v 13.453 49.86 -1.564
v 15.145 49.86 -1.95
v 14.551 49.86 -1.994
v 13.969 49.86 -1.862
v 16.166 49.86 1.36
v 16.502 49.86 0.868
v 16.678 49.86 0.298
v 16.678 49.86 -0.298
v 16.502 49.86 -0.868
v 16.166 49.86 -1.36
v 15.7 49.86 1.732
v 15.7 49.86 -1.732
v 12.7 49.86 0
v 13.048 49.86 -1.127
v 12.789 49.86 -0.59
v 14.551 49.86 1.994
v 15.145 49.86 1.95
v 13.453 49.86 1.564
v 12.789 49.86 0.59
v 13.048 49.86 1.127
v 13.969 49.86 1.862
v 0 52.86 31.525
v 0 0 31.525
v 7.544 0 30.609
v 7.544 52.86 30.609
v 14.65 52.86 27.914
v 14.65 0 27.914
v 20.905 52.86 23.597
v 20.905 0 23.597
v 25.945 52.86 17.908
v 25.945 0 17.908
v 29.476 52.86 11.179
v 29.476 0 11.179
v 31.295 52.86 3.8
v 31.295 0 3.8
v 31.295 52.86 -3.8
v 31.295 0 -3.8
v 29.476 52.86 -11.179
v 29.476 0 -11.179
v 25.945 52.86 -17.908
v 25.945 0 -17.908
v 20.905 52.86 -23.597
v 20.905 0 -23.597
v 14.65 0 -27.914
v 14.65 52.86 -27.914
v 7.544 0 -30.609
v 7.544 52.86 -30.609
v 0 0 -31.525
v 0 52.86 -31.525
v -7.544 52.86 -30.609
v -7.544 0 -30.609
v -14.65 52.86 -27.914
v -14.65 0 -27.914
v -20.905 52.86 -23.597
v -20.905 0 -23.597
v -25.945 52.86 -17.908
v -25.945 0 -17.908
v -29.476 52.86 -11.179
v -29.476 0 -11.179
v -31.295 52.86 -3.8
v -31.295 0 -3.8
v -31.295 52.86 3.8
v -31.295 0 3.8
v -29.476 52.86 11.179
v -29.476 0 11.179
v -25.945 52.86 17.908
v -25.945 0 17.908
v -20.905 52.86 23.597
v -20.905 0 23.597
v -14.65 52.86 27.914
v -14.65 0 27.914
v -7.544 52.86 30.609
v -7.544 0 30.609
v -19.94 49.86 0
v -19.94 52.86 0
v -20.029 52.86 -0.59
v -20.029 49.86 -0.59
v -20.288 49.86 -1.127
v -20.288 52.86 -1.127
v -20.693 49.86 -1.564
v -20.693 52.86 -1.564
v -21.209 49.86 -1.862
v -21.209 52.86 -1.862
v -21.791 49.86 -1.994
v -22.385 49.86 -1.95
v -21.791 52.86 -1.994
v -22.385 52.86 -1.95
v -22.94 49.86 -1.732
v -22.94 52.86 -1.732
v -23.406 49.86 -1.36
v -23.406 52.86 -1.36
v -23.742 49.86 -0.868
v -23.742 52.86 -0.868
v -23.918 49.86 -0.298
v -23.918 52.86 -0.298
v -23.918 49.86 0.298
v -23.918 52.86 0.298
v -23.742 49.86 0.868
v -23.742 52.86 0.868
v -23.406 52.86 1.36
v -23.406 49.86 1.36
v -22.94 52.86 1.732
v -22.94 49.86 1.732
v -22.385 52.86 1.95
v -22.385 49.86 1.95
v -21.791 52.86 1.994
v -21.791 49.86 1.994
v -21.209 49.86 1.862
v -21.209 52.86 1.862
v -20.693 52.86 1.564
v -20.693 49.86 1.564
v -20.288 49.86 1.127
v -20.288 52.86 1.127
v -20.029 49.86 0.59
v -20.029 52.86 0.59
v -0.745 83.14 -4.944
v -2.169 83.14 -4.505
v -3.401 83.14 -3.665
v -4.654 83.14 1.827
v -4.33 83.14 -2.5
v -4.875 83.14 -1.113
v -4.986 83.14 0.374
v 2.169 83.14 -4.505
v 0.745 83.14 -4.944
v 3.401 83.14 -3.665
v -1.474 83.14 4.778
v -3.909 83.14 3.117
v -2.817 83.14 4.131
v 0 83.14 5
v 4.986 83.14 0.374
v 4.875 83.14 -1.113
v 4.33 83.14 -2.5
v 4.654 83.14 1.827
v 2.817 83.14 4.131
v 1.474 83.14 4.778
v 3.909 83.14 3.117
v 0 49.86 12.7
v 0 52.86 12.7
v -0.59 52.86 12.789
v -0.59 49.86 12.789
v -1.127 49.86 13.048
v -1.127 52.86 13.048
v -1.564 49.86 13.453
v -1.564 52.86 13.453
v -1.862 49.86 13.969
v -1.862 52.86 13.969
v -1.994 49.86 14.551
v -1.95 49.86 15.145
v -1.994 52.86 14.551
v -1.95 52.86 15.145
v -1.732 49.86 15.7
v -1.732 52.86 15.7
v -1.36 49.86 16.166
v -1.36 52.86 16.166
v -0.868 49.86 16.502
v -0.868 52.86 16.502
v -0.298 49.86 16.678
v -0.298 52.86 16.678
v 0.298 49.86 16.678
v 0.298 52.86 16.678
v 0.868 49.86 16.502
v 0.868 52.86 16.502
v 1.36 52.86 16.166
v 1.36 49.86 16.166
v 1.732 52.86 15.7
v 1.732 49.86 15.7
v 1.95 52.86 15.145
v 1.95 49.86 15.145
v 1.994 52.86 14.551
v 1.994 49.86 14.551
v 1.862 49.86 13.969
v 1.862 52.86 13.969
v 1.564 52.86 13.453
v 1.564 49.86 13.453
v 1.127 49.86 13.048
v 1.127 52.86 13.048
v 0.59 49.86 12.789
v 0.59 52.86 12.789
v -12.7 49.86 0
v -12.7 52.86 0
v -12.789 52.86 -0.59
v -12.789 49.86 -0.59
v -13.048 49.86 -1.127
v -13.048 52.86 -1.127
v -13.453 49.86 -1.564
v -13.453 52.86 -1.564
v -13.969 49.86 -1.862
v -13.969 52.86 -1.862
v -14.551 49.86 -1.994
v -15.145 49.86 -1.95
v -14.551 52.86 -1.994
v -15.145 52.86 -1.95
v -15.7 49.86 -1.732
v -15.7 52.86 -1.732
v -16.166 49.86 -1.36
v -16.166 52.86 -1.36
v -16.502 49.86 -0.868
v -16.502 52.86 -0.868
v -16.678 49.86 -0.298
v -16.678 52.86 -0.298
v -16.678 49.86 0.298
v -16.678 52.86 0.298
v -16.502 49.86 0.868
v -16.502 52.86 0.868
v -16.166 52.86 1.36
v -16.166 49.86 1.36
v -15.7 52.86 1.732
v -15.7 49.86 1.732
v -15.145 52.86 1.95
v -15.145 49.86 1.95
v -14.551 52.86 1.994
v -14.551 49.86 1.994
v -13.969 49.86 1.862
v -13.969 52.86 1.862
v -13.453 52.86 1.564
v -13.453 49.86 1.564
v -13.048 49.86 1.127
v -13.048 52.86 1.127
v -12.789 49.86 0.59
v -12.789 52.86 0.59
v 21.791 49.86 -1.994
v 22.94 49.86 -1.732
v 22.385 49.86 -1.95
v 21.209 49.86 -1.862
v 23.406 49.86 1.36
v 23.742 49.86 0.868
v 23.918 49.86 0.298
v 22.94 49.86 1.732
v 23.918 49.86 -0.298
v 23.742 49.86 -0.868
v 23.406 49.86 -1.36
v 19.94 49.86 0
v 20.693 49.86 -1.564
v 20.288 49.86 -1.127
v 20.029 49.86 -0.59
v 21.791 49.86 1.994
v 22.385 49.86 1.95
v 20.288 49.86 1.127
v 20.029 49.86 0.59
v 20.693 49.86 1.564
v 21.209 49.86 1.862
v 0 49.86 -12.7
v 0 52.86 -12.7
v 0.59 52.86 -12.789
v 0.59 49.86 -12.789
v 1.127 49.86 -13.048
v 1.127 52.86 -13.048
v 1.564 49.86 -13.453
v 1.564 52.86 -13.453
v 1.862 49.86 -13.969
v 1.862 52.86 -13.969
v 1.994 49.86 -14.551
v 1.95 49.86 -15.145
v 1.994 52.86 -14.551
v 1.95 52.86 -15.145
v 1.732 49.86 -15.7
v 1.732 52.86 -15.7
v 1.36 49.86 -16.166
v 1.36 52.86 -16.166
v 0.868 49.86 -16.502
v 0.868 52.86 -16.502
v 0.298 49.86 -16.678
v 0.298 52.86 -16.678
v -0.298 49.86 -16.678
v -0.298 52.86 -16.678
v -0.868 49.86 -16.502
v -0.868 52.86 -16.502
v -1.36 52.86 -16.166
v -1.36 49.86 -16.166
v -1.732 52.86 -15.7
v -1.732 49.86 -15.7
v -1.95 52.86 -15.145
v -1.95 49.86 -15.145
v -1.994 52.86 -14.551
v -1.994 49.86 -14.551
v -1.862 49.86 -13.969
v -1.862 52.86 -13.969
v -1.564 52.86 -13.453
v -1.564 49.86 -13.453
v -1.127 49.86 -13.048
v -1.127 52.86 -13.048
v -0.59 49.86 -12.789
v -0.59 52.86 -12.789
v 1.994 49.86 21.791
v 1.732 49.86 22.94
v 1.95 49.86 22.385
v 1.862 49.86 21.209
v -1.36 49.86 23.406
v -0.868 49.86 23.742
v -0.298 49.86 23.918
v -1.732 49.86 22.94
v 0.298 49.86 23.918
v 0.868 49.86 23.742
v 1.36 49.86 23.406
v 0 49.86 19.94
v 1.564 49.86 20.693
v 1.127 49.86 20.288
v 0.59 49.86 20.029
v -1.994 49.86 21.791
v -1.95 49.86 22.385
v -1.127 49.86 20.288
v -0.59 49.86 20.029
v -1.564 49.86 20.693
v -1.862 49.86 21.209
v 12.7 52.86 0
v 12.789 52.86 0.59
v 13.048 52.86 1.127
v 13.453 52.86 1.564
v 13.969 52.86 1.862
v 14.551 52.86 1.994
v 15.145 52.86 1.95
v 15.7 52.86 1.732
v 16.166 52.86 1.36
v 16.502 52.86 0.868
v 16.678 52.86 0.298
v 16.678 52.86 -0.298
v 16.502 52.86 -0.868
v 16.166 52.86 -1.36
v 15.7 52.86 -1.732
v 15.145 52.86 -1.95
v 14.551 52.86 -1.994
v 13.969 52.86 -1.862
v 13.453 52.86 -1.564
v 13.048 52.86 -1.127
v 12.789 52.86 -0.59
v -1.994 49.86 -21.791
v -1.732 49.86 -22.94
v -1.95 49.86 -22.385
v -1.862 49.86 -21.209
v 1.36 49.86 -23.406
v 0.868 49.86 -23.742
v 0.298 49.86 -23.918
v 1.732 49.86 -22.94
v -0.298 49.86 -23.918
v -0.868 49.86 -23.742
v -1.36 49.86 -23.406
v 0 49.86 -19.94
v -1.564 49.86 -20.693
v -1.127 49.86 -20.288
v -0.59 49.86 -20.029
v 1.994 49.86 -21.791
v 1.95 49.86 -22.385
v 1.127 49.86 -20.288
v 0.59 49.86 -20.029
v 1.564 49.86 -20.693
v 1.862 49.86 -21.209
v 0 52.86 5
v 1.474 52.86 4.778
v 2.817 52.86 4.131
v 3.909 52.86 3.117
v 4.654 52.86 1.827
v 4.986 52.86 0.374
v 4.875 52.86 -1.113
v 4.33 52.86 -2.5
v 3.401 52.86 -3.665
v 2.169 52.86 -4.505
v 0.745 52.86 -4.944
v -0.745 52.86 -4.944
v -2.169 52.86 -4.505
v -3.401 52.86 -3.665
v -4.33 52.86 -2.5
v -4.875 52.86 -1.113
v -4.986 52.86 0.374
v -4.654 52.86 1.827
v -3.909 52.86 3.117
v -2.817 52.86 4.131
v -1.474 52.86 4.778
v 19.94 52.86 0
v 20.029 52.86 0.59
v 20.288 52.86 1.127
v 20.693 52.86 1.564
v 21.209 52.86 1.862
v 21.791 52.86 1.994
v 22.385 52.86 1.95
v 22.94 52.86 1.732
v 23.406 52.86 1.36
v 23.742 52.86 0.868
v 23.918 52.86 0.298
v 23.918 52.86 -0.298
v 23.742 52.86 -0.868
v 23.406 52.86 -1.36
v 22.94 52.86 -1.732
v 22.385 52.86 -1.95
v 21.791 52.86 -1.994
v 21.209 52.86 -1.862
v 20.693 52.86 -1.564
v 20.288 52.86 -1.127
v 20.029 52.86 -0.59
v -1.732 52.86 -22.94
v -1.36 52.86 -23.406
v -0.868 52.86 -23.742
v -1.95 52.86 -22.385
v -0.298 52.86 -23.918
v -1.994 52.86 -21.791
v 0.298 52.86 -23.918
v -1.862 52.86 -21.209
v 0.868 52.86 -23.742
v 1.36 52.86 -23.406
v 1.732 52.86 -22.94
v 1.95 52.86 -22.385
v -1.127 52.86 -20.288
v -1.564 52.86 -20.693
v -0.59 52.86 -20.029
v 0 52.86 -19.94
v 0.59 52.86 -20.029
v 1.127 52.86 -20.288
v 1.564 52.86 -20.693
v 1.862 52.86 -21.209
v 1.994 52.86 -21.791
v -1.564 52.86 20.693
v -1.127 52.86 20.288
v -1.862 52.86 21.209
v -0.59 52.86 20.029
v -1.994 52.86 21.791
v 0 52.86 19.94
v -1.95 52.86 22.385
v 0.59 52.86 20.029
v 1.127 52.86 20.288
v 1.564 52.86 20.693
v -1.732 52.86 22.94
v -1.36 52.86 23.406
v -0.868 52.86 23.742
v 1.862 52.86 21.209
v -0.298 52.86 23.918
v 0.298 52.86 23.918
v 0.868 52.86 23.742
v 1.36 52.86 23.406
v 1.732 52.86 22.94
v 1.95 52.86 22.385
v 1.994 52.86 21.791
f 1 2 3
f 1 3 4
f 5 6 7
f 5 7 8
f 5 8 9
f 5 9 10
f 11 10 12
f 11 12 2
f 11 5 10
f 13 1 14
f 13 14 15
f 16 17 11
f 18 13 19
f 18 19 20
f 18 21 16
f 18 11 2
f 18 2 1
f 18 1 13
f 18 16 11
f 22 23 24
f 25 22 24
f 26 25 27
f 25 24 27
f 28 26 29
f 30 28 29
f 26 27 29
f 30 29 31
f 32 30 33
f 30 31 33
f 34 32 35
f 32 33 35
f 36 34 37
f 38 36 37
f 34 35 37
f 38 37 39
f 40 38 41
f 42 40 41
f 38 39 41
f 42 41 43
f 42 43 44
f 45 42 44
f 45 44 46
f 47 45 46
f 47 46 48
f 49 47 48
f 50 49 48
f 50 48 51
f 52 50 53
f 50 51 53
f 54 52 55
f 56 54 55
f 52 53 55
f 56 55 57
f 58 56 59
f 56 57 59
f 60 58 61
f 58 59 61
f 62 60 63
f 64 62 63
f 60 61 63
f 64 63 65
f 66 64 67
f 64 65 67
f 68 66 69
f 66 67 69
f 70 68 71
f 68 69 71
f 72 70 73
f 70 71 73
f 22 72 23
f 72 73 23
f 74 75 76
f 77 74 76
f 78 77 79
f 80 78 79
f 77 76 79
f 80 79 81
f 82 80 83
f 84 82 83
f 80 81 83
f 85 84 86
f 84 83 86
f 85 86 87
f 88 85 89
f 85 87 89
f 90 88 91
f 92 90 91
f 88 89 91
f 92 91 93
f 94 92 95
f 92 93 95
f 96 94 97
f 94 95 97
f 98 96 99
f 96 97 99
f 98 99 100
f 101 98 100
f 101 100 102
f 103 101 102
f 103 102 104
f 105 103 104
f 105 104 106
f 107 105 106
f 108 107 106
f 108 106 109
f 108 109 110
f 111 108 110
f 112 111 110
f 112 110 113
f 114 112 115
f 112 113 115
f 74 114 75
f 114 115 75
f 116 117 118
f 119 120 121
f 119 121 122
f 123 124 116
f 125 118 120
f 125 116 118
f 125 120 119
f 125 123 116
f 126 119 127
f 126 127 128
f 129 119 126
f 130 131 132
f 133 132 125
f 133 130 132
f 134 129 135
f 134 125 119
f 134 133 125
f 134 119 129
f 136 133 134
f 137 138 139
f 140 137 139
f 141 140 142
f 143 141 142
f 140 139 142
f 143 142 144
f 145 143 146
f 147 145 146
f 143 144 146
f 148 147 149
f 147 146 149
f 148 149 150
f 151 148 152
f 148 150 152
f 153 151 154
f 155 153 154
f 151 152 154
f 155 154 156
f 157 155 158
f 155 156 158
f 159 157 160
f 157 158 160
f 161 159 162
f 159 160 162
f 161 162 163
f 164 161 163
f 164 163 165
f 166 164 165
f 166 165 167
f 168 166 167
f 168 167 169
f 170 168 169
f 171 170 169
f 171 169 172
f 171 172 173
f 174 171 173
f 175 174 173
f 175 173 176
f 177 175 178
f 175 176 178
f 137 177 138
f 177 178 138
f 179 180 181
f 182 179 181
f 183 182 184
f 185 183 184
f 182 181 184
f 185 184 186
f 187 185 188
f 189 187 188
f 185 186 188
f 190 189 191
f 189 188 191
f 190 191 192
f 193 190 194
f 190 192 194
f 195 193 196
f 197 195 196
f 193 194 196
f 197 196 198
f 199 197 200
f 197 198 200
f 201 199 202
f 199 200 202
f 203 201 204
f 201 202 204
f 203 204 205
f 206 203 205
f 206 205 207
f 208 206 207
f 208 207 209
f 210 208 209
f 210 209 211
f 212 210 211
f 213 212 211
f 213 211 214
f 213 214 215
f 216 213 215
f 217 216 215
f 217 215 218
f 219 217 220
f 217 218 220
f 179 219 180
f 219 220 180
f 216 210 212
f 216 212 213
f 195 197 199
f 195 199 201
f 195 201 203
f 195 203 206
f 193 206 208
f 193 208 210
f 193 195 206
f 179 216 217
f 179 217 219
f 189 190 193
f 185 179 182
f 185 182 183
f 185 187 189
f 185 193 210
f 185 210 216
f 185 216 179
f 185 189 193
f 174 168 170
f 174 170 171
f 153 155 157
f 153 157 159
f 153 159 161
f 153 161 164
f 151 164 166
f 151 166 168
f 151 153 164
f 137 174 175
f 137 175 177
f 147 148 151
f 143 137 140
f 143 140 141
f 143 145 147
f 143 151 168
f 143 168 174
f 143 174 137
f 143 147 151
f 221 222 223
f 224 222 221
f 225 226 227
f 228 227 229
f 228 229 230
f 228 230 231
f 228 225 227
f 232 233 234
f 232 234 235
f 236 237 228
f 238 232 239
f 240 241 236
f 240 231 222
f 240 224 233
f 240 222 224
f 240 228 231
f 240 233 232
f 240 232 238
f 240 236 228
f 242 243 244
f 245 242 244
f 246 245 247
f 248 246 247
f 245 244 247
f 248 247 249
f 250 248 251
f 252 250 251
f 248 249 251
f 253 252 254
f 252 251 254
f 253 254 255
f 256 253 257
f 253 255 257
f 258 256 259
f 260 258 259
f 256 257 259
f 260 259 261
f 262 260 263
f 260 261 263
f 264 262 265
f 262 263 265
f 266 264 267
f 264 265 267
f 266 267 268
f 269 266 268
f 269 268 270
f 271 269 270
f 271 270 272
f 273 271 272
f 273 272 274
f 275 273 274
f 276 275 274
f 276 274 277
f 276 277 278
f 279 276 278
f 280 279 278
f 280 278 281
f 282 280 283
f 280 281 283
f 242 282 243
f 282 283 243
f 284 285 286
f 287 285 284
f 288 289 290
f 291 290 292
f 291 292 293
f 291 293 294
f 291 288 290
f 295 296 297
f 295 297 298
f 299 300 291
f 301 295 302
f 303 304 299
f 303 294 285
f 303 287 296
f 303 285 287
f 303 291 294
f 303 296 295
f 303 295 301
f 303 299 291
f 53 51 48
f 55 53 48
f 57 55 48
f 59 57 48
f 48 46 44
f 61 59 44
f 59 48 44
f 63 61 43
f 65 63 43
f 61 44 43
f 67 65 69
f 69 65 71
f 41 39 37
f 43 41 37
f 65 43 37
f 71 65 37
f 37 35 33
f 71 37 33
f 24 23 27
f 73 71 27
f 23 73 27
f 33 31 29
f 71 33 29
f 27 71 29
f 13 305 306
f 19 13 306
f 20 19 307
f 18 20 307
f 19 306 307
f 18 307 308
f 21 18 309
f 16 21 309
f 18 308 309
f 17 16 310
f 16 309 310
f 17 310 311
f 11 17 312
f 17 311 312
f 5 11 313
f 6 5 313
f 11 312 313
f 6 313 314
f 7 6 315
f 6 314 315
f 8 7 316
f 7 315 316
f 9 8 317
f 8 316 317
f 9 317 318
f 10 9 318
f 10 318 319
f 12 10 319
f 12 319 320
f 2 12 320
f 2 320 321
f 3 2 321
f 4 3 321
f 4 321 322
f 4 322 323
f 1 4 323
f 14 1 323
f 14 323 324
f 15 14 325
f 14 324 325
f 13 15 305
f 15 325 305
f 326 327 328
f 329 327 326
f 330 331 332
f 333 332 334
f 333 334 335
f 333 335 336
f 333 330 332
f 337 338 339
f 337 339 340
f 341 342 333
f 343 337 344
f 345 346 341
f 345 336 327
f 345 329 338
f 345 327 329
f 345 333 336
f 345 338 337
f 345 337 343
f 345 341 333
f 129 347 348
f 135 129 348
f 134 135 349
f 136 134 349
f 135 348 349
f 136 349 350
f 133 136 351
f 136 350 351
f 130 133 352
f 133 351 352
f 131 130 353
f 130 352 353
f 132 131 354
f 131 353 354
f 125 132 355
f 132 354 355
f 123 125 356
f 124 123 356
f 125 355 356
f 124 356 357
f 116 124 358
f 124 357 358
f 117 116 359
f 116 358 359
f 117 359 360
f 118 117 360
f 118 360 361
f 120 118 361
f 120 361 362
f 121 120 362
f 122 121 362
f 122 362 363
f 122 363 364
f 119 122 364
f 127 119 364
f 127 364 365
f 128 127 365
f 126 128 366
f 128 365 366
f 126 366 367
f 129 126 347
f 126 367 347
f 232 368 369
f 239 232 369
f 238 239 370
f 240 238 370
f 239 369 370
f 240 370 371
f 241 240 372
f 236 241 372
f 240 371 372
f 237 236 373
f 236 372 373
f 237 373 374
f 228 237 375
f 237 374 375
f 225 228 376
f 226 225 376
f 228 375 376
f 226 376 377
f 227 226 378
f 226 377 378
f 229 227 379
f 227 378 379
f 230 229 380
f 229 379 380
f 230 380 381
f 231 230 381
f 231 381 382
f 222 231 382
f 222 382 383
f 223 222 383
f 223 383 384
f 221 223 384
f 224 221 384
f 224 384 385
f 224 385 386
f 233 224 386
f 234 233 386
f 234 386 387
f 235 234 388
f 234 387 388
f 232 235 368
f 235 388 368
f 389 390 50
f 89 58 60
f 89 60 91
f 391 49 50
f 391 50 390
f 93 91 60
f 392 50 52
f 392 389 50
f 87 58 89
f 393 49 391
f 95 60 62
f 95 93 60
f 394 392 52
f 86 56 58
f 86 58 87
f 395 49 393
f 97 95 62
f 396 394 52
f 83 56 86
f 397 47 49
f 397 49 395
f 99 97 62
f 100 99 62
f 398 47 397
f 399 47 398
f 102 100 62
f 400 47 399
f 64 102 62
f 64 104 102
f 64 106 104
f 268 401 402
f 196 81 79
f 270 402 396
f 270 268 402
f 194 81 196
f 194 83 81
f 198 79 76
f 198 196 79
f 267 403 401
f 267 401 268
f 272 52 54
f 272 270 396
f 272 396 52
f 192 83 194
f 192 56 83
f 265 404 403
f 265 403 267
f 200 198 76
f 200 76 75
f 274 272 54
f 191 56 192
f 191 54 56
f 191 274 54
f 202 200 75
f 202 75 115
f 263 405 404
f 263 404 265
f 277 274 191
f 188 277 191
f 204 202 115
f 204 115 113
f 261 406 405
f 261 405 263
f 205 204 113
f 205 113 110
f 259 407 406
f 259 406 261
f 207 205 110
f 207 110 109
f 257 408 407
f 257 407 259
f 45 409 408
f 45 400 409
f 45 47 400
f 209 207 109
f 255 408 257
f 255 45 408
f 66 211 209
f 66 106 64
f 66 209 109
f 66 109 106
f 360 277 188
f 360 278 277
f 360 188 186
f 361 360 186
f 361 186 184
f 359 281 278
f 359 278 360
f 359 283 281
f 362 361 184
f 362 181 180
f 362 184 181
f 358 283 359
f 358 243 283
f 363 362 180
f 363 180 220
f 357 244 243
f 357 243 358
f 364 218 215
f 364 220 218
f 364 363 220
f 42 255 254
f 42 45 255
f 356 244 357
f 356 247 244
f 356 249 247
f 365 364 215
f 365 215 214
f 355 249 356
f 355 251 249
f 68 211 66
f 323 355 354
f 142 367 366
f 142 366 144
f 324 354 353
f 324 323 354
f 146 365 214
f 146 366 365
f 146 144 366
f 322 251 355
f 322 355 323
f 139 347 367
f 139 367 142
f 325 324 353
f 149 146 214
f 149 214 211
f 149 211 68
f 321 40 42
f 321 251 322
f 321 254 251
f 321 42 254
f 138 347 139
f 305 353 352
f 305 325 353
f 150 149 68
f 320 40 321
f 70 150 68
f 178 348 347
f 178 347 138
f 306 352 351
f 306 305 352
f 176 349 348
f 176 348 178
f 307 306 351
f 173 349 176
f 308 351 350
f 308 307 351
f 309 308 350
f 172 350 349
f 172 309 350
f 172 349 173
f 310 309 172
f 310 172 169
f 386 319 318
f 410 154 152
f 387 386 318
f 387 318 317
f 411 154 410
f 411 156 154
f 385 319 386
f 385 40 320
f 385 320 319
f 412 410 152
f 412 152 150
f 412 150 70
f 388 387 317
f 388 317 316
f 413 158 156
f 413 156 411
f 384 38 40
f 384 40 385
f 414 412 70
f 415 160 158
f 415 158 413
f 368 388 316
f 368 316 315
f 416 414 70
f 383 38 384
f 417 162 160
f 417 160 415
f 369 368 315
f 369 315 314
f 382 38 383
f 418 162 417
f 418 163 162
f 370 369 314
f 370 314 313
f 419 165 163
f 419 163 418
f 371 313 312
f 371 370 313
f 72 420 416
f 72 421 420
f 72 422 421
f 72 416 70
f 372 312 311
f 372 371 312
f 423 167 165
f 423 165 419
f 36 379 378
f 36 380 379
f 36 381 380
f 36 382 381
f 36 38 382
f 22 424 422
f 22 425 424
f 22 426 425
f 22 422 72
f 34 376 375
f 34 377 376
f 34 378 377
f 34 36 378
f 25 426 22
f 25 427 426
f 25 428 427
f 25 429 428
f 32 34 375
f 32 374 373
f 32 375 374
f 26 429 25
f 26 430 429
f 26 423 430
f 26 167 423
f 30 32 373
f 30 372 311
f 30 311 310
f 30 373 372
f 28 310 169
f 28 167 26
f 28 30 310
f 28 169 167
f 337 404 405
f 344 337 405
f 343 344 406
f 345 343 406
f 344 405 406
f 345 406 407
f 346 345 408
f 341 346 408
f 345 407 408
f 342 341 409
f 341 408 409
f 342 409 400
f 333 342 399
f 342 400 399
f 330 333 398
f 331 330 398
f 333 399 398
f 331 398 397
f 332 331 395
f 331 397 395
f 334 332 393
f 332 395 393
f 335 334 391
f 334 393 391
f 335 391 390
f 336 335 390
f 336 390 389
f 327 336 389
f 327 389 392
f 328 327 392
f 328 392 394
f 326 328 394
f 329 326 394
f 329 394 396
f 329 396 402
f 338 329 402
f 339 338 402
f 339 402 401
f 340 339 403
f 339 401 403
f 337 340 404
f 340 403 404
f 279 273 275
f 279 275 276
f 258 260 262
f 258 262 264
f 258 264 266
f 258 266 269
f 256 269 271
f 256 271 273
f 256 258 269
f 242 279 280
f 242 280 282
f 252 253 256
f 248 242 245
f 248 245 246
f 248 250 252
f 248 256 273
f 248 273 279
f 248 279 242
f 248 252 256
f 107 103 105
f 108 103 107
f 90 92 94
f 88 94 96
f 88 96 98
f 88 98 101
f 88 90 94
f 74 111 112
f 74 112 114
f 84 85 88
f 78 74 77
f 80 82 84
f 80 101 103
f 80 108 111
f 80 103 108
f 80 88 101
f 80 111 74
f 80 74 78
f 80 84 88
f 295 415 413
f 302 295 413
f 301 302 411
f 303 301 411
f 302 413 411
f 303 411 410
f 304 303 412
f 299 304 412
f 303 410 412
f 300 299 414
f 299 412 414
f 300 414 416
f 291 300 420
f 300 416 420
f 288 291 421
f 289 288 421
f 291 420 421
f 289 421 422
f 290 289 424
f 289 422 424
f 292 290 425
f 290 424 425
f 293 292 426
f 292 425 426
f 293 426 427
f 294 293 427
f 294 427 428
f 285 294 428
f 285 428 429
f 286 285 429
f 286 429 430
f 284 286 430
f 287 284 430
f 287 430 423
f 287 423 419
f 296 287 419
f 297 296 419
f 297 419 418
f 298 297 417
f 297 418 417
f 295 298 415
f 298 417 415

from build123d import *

# Parameters (mm, degrees)
SKETCH1_R           = 31.525
BOSS_EXTRUDE1_DEPTH = 52.86
SKETCH2_R           = 5
BOSS_EXTRUDE2_DEPTH = 30.28
SKETCH3_R           = 2
CUT_EXTRUDE1_DEPTH  = 3
CIRPATTERN11_COUNT  = 4


with BuildPart() as part:
    # Sketch1 → Boss-Extrude1 (new body)
    with BuildSketch(Plane(origin=(0, 0, 0), x_dir=(1, 0, 0), z_dir=(0, 1, 0))):
        with Locations(Location((0, 0, 0), (0, 0, 270))):
            Circle(SKETCH1_R)
    extrude(amount=BOSS_EXTRUDE1_DEPTH)

    # Sketch2 → Boss-Extrude2 (add)
    with BuildSketch(Plane(origin=(0, 52.86, 0), x_dir=(1, 0, 0), z_dir=(0, 1, 0))):
        with Locations(Location((0, 0, 0), (0, 0, 270))):
            Circle(SKETCH2_R)
    extrude(amount=BOSS_EXTRUDE2_DEPTH)

    # Sketch3 → Cut-Extrude1 (cut)
    with BuildSketch(Plane(origin=(0, 52.86, 0), x_dir=(1, 0, 0), z_dir=(0, 1, 0))):
        with Locations(Location((0, 14.7, 0), (0, 0, 270))):
            Circle(SKETCH3_R)
        with Locations(Location((0, 21.94, 0), (0, 0, 270))):
            Circle(SKETCH3_R)
    cut_extrude1 = extrude(amount=-CUT_EXTRUDE1_DEPTH, mode=Mode.SUBTRACT)

    # CirPattern11: Cut-Extrude1 ×4 about axis
    cirpattern11_axis = Axis((0, 0, 0), (0, 1, 0))
    for i in range(1, CIRPATTERN11_COUNT):
        add(cut_extrude1.rotate(cirpattern11_axis, i * 360 / CIRPATTERN11_COUNT), mode=Mode.SUBTRACT)


solid = part.part
